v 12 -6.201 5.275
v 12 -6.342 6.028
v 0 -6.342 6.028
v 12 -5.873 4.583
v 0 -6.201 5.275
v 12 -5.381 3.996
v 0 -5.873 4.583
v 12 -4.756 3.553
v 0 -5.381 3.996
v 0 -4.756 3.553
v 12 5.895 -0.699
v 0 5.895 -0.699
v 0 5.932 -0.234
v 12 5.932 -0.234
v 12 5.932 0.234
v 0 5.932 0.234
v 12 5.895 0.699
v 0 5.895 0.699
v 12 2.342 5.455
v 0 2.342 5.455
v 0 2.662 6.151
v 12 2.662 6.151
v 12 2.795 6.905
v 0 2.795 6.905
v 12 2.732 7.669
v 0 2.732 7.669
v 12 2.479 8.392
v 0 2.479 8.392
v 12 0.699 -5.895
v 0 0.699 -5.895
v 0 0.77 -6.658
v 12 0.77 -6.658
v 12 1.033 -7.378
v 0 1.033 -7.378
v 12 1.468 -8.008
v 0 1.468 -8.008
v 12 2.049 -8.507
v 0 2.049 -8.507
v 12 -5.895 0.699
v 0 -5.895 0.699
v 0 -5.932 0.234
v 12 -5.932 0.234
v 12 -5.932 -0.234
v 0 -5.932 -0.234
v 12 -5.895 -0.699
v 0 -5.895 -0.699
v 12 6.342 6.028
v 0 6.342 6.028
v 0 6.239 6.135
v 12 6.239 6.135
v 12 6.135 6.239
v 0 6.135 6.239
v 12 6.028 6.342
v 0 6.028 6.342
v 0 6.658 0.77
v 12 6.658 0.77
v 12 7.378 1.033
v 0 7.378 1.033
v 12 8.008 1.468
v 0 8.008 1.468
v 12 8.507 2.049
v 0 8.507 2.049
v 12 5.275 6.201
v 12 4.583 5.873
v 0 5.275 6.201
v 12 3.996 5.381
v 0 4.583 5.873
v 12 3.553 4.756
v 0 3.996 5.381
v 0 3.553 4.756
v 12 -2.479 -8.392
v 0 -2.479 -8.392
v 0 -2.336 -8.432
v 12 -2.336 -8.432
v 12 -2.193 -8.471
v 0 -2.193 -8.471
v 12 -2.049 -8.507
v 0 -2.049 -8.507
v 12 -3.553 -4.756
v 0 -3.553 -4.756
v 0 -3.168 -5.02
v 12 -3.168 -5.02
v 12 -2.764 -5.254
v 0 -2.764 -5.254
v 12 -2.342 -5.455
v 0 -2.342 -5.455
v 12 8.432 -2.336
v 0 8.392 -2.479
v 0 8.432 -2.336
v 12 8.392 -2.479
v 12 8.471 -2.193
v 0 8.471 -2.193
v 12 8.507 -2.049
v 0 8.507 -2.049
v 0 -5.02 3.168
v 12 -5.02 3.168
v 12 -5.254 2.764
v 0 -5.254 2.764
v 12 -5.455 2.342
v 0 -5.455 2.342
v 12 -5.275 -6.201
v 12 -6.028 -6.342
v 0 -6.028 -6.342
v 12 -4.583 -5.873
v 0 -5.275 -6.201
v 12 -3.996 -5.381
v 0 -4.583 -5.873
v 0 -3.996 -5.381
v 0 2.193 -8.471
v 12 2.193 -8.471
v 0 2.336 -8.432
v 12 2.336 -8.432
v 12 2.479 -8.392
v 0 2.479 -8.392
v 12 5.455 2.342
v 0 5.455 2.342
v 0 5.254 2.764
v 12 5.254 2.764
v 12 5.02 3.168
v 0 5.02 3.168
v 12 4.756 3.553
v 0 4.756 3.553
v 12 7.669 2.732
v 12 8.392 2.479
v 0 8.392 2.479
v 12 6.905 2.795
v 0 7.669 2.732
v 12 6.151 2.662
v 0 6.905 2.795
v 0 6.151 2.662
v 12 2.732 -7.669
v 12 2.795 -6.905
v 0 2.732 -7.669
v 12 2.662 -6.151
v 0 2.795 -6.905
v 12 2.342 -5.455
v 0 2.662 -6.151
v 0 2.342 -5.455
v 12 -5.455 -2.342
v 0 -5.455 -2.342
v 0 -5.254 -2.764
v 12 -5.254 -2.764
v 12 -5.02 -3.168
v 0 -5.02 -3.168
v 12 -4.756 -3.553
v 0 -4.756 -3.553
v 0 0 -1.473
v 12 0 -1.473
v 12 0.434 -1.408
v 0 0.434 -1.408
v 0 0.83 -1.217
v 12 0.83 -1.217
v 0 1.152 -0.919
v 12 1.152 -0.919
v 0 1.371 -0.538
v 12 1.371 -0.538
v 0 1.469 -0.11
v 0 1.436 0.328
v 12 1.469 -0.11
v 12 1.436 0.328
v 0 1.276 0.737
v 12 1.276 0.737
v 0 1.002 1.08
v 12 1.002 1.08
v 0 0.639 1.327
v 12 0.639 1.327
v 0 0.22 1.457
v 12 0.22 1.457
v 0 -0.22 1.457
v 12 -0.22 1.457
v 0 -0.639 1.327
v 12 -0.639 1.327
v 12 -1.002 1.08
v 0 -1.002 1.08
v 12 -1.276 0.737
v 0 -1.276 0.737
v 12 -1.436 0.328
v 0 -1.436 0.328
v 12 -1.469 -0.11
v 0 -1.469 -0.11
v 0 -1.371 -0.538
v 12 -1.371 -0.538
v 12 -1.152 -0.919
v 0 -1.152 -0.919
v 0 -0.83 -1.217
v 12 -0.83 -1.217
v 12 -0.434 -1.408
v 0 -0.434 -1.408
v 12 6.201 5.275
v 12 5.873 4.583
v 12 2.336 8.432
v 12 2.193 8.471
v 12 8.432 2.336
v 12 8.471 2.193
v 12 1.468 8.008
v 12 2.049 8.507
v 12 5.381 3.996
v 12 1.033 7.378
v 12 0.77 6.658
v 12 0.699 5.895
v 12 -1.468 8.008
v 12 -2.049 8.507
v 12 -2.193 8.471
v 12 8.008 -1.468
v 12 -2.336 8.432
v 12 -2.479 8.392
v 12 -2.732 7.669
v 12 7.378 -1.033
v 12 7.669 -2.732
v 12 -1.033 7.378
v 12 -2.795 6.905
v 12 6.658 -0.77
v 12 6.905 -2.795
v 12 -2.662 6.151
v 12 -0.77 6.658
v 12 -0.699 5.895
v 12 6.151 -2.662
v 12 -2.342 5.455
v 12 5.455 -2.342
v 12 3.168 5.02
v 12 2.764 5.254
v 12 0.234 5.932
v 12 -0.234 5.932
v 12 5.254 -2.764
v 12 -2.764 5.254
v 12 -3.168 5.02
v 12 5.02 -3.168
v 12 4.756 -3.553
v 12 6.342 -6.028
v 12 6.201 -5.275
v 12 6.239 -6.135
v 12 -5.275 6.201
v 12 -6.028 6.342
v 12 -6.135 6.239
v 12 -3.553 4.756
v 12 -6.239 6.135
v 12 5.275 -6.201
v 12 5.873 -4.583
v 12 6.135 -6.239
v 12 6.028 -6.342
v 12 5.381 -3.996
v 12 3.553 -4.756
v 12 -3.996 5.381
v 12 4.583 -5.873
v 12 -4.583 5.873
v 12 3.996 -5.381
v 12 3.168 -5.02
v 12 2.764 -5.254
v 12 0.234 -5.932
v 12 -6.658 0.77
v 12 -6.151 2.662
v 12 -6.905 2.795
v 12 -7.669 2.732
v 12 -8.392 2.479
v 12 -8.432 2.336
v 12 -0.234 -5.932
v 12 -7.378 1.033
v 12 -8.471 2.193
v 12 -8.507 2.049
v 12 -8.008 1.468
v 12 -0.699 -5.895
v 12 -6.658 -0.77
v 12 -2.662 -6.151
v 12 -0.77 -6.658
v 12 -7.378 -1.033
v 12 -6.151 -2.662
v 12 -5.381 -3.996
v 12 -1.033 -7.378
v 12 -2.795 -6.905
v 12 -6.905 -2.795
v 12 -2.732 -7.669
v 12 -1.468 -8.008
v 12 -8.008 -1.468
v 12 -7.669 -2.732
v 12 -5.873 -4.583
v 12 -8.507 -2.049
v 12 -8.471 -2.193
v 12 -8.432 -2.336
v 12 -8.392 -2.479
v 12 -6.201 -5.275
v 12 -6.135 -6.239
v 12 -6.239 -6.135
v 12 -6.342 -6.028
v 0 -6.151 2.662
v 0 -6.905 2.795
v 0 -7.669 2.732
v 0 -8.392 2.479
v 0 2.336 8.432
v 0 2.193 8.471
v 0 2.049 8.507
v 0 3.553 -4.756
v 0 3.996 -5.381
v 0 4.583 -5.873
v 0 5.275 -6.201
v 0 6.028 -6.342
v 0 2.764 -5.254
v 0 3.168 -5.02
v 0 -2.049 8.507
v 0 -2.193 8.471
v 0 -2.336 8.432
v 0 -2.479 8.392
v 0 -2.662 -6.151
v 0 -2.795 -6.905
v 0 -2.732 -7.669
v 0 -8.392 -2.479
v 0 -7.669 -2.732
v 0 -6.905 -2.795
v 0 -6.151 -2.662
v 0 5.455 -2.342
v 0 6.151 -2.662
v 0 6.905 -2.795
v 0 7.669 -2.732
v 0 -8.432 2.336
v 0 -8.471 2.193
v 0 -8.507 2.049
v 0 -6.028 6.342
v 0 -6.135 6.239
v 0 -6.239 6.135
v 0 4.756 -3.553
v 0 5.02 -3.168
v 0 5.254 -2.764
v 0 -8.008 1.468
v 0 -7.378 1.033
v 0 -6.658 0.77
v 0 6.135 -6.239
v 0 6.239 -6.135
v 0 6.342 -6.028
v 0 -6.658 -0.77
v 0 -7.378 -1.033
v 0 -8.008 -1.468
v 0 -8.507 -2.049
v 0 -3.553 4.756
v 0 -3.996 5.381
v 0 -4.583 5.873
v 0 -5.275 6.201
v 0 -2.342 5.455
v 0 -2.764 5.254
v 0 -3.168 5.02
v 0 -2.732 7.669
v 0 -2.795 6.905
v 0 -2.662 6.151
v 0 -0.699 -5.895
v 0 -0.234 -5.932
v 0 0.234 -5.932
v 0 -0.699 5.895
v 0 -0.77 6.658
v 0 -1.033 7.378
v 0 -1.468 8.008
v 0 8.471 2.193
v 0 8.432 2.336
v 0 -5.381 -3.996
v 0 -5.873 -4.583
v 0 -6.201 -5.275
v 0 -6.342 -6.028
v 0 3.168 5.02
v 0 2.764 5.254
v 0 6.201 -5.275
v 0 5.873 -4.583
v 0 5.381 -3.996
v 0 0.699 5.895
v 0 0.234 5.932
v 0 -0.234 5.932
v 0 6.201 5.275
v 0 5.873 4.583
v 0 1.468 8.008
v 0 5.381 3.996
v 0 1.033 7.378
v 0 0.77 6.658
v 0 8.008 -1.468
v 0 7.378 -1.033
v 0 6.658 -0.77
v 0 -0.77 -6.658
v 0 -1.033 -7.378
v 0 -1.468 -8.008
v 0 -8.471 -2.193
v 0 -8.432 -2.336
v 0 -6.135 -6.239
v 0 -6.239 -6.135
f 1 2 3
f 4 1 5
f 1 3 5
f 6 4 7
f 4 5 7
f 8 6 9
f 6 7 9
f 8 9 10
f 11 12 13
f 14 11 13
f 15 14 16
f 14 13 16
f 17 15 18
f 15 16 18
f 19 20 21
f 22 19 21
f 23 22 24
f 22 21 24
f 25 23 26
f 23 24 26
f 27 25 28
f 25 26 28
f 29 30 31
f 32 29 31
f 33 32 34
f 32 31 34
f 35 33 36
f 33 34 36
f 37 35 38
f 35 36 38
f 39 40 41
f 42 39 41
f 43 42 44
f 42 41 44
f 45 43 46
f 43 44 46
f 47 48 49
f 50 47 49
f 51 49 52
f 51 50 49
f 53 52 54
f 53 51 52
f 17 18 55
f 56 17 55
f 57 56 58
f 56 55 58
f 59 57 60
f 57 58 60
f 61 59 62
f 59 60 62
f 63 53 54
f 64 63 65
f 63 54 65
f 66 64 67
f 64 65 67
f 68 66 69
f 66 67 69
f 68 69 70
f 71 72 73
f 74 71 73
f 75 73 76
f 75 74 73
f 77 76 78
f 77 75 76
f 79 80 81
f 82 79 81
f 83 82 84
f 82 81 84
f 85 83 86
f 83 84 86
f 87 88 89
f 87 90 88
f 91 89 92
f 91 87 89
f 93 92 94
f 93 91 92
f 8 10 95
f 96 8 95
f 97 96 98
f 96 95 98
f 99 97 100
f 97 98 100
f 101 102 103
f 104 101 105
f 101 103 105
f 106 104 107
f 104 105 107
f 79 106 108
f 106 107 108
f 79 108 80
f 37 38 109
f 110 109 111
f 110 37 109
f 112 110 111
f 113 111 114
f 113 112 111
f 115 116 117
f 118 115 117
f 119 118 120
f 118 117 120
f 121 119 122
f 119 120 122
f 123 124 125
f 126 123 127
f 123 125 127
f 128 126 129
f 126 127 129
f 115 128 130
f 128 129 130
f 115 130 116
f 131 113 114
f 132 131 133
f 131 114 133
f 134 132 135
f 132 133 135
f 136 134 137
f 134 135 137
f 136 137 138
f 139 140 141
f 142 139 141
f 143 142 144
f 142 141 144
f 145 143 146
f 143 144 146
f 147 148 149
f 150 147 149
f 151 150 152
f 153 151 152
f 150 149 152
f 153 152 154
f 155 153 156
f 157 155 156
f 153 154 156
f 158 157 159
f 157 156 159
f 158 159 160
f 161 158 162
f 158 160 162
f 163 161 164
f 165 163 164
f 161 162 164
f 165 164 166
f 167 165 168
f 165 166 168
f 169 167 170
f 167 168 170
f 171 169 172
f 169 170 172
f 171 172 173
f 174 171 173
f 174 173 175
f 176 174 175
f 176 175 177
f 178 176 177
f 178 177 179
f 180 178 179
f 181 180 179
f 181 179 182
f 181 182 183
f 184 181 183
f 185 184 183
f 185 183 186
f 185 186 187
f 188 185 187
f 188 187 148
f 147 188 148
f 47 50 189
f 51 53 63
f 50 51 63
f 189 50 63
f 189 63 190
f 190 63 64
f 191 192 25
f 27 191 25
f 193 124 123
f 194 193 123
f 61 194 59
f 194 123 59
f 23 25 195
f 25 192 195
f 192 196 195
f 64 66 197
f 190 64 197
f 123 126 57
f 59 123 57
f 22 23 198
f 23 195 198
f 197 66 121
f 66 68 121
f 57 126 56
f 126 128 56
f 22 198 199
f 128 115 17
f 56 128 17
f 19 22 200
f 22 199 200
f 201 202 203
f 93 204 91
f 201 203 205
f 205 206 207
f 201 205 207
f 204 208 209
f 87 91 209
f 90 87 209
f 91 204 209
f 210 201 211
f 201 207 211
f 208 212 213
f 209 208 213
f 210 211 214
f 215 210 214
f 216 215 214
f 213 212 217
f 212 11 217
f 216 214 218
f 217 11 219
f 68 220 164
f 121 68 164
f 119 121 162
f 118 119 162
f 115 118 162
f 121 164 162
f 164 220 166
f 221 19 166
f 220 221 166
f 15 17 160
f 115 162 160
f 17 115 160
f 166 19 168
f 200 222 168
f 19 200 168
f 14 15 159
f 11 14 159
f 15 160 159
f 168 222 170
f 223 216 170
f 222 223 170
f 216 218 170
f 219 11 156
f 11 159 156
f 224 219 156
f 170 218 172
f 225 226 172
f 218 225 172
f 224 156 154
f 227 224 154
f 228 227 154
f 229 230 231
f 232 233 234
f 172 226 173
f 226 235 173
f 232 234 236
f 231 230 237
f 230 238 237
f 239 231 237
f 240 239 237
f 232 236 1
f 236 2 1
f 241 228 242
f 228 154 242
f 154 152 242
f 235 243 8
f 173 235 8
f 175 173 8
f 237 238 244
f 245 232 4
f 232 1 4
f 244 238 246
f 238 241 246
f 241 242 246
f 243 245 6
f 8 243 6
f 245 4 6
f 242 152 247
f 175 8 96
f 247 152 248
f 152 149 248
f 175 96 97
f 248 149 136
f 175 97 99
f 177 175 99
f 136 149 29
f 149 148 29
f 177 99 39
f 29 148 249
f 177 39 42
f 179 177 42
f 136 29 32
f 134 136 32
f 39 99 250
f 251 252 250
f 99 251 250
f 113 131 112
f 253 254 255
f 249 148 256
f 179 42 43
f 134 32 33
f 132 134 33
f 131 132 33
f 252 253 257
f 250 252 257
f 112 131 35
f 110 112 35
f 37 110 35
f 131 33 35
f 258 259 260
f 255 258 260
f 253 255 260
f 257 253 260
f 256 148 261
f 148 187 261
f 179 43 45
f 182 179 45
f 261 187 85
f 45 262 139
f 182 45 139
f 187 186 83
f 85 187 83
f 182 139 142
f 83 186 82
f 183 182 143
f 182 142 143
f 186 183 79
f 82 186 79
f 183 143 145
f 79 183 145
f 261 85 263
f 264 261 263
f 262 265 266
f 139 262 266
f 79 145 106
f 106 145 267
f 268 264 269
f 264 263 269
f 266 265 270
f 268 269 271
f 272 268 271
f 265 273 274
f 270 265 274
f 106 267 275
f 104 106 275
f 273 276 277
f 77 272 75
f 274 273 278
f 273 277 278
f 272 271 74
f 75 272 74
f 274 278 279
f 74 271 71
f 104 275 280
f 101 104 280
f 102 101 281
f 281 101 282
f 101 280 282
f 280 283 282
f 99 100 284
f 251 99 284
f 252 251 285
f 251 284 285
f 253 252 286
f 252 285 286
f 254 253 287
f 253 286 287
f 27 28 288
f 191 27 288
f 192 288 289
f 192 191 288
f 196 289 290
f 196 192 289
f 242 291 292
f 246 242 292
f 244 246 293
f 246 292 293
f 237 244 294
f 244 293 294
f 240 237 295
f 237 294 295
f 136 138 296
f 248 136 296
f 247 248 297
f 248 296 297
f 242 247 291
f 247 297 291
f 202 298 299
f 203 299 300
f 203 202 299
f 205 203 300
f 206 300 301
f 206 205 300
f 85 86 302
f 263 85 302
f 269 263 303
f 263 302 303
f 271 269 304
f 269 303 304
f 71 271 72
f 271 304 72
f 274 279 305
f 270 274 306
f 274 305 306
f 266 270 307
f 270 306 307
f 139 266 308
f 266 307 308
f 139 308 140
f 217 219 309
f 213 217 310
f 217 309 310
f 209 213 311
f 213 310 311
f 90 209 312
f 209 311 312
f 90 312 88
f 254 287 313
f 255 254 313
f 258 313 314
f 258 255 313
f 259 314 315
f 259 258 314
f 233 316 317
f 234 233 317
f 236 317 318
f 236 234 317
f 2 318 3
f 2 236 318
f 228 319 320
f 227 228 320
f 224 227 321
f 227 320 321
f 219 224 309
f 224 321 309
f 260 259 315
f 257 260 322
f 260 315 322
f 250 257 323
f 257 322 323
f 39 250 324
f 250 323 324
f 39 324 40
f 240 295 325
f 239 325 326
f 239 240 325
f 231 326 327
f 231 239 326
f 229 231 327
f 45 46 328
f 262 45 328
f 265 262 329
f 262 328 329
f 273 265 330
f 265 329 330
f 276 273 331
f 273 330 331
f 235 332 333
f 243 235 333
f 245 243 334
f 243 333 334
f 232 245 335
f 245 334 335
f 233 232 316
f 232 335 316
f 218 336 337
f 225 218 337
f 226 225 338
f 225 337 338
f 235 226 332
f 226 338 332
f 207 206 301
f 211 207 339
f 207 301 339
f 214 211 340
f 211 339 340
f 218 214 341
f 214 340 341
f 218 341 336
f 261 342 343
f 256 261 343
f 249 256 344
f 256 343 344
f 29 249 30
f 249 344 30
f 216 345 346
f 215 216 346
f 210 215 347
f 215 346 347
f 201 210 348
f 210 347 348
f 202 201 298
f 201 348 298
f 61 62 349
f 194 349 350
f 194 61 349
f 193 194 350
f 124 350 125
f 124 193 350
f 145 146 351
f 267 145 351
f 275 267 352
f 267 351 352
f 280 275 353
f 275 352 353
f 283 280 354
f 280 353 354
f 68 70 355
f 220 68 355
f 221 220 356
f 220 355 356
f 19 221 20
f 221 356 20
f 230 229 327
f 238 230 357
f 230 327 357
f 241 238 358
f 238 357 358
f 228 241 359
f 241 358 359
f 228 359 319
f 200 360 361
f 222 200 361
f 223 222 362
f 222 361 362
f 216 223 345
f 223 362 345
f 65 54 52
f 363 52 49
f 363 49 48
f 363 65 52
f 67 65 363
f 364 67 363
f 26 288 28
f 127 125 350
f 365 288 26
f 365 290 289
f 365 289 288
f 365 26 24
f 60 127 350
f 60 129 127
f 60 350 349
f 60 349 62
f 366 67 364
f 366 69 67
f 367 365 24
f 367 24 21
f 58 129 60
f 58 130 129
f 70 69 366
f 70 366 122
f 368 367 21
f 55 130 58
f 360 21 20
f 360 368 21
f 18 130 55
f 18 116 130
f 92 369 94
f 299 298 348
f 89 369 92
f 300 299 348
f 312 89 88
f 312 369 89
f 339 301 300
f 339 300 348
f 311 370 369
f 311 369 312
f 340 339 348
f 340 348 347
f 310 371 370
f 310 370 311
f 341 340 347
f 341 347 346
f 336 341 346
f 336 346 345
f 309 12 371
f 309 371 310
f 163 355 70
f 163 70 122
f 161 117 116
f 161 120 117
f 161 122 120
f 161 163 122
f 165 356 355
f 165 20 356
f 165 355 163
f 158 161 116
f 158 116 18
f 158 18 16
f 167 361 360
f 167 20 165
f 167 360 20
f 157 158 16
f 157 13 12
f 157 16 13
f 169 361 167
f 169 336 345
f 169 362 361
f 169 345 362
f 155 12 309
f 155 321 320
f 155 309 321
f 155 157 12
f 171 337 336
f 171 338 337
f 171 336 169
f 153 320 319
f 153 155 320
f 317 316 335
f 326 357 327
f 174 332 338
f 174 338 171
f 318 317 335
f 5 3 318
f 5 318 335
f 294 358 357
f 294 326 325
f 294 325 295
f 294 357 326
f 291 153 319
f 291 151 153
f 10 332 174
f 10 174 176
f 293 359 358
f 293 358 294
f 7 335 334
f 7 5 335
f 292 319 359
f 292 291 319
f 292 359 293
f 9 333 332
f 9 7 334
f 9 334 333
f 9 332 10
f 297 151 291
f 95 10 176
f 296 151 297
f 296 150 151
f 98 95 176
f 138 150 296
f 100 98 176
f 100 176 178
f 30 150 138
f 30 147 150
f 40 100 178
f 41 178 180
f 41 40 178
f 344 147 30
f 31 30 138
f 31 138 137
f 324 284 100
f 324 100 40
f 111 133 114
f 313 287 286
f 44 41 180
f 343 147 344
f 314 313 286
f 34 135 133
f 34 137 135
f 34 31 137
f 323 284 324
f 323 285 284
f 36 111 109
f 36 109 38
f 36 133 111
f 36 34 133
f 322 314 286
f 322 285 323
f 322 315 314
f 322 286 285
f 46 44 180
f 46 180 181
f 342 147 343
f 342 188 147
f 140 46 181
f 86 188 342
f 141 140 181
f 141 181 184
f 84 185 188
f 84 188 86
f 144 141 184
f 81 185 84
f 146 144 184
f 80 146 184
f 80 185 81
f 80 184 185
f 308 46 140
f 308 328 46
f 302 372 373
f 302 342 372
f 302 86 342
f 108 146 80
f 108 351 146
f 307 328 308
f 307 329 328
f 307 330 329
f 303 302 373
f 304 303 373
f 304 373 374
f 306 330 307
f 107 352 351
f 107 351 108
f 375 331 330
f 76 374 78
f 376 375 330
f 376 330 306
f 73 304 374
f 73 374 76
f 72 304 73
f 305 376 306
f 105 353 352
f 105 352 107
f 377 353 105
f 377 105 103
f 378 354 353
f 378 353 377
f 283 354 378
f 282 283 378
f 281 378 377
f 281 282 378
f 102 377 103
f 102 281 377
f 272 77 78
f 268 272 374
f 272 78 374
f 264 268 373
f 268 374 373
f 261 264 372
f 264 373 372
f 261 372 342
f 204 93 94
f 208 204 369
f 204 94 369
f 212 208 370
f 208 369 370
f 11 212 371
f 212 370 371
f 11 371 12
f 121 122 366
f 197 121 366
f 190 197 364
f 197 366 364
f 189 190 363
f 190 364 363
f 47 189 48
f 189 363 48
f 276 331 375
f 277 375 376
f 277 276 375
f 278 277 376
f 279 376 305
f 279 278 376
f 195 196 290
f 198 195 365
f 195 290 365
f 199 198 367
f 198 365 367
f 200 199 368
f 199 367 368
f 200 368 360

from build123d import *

# Parameters (mm, degrees)
BASPROSKE_W        = 12
BASPROSKE_H        = 8.75
TOOTHCUT_DEPTH     = 18.237314176
TEETHCUTS_COUNT    = 12
TEETHCUTS_ANGLE    = 330
BORSKE_R           = 0.4
BORE_DEPTH         = 50.0000508
SKETCH3_R          = 1.4732
CUT_EXTRUDE1_DEPTH = 17.991923373


with BuildPart() as part:
    # BasProSke → Base-Revolve (revolve)
    with BuildSketch(Plane(origin=(0, 0, 0), x_dir=(1, 0, 0), z_dir=(0, 1, 0)), mode=Mode.PRIVATE) as base_revolve_sk:
        with Locations((6, 4.375)):
            Rectangle(BASPROSKE_W, BASPROSKE_H)
    revolve(base_revolve_sk.sketch.rotate(Axis((-10, 0, 0), (1, 0, 0)), 180), axis=Axis((-10, 0, 0), (1, 0, 0)))

    # TooCutSke → ToothCut (cut, through all)
    with BuildSketch(Plane(origin=(0, 0, 0), x_dir=(0, 0, -1), z_dir=(1, 0, 0))):
        with BuildLine():
            ThreePointArc((0.699286786, 5.895170077), (0, 5.9365), (-0.699286786, 5.895170077))
            ThreePointArc((-0.699286786, 5.895170077), (-1.040581249, 7.393099844), (-2.078649209, 8.525659073))
            ThreePointArc((-2.078649209, 8.525659073), (0, 8.7754), (2.078649209, 8.525659073))
            ThreePointArc((2.078649209, 8.525659073), (1.040581249, 7.393099844), (0.699286786, 5.895170077))
        make_face()
    toothcut = extrude(amount=TOOTHCUT_DEPTH, mode=Mode.SUBTRACT)

    # TeethCuts: ToothCut ×12 about axis
    teethcuts_axis = Axis((-10, 0, 0), (1, 0, 0))
    for i in range(1, TEETHCUTS_COUNT):
        add(toothcut.rotate(teethcuts_axis, i * TEETHCUTS_ANGLE / (TEETHCUTS_COUNT - 1)), mode=Mode.SUBTRACT)

    # BorSke → Bore (cut, symmetric)
    with BuildSketch(Plane(origin=(0, 0, 0), x_dir=(0, 0, -1), z_dir=(1, 0, 0))):
        with Locations(Location((0, 0, 0), (0, 0, 180))):
            Circle(BORSKE_R)
    extrude(amount=BORE_DEPTH, both=True, mode=Mode.SUBTRACT)

    # Sketch3 → Cut-Extrude1 (cut, through all)
    with BuildSketch(Plane(origin=(12, 0, 0), x_dir=(0, 0, -1), z_dir=(1, 0, 0))):
        Circle(SKETCH3_R)
    extrude(amount=-CUT_EXTRUDE1_DEPTH, mode=Mode.SUBTRACT)


solid = part.part
